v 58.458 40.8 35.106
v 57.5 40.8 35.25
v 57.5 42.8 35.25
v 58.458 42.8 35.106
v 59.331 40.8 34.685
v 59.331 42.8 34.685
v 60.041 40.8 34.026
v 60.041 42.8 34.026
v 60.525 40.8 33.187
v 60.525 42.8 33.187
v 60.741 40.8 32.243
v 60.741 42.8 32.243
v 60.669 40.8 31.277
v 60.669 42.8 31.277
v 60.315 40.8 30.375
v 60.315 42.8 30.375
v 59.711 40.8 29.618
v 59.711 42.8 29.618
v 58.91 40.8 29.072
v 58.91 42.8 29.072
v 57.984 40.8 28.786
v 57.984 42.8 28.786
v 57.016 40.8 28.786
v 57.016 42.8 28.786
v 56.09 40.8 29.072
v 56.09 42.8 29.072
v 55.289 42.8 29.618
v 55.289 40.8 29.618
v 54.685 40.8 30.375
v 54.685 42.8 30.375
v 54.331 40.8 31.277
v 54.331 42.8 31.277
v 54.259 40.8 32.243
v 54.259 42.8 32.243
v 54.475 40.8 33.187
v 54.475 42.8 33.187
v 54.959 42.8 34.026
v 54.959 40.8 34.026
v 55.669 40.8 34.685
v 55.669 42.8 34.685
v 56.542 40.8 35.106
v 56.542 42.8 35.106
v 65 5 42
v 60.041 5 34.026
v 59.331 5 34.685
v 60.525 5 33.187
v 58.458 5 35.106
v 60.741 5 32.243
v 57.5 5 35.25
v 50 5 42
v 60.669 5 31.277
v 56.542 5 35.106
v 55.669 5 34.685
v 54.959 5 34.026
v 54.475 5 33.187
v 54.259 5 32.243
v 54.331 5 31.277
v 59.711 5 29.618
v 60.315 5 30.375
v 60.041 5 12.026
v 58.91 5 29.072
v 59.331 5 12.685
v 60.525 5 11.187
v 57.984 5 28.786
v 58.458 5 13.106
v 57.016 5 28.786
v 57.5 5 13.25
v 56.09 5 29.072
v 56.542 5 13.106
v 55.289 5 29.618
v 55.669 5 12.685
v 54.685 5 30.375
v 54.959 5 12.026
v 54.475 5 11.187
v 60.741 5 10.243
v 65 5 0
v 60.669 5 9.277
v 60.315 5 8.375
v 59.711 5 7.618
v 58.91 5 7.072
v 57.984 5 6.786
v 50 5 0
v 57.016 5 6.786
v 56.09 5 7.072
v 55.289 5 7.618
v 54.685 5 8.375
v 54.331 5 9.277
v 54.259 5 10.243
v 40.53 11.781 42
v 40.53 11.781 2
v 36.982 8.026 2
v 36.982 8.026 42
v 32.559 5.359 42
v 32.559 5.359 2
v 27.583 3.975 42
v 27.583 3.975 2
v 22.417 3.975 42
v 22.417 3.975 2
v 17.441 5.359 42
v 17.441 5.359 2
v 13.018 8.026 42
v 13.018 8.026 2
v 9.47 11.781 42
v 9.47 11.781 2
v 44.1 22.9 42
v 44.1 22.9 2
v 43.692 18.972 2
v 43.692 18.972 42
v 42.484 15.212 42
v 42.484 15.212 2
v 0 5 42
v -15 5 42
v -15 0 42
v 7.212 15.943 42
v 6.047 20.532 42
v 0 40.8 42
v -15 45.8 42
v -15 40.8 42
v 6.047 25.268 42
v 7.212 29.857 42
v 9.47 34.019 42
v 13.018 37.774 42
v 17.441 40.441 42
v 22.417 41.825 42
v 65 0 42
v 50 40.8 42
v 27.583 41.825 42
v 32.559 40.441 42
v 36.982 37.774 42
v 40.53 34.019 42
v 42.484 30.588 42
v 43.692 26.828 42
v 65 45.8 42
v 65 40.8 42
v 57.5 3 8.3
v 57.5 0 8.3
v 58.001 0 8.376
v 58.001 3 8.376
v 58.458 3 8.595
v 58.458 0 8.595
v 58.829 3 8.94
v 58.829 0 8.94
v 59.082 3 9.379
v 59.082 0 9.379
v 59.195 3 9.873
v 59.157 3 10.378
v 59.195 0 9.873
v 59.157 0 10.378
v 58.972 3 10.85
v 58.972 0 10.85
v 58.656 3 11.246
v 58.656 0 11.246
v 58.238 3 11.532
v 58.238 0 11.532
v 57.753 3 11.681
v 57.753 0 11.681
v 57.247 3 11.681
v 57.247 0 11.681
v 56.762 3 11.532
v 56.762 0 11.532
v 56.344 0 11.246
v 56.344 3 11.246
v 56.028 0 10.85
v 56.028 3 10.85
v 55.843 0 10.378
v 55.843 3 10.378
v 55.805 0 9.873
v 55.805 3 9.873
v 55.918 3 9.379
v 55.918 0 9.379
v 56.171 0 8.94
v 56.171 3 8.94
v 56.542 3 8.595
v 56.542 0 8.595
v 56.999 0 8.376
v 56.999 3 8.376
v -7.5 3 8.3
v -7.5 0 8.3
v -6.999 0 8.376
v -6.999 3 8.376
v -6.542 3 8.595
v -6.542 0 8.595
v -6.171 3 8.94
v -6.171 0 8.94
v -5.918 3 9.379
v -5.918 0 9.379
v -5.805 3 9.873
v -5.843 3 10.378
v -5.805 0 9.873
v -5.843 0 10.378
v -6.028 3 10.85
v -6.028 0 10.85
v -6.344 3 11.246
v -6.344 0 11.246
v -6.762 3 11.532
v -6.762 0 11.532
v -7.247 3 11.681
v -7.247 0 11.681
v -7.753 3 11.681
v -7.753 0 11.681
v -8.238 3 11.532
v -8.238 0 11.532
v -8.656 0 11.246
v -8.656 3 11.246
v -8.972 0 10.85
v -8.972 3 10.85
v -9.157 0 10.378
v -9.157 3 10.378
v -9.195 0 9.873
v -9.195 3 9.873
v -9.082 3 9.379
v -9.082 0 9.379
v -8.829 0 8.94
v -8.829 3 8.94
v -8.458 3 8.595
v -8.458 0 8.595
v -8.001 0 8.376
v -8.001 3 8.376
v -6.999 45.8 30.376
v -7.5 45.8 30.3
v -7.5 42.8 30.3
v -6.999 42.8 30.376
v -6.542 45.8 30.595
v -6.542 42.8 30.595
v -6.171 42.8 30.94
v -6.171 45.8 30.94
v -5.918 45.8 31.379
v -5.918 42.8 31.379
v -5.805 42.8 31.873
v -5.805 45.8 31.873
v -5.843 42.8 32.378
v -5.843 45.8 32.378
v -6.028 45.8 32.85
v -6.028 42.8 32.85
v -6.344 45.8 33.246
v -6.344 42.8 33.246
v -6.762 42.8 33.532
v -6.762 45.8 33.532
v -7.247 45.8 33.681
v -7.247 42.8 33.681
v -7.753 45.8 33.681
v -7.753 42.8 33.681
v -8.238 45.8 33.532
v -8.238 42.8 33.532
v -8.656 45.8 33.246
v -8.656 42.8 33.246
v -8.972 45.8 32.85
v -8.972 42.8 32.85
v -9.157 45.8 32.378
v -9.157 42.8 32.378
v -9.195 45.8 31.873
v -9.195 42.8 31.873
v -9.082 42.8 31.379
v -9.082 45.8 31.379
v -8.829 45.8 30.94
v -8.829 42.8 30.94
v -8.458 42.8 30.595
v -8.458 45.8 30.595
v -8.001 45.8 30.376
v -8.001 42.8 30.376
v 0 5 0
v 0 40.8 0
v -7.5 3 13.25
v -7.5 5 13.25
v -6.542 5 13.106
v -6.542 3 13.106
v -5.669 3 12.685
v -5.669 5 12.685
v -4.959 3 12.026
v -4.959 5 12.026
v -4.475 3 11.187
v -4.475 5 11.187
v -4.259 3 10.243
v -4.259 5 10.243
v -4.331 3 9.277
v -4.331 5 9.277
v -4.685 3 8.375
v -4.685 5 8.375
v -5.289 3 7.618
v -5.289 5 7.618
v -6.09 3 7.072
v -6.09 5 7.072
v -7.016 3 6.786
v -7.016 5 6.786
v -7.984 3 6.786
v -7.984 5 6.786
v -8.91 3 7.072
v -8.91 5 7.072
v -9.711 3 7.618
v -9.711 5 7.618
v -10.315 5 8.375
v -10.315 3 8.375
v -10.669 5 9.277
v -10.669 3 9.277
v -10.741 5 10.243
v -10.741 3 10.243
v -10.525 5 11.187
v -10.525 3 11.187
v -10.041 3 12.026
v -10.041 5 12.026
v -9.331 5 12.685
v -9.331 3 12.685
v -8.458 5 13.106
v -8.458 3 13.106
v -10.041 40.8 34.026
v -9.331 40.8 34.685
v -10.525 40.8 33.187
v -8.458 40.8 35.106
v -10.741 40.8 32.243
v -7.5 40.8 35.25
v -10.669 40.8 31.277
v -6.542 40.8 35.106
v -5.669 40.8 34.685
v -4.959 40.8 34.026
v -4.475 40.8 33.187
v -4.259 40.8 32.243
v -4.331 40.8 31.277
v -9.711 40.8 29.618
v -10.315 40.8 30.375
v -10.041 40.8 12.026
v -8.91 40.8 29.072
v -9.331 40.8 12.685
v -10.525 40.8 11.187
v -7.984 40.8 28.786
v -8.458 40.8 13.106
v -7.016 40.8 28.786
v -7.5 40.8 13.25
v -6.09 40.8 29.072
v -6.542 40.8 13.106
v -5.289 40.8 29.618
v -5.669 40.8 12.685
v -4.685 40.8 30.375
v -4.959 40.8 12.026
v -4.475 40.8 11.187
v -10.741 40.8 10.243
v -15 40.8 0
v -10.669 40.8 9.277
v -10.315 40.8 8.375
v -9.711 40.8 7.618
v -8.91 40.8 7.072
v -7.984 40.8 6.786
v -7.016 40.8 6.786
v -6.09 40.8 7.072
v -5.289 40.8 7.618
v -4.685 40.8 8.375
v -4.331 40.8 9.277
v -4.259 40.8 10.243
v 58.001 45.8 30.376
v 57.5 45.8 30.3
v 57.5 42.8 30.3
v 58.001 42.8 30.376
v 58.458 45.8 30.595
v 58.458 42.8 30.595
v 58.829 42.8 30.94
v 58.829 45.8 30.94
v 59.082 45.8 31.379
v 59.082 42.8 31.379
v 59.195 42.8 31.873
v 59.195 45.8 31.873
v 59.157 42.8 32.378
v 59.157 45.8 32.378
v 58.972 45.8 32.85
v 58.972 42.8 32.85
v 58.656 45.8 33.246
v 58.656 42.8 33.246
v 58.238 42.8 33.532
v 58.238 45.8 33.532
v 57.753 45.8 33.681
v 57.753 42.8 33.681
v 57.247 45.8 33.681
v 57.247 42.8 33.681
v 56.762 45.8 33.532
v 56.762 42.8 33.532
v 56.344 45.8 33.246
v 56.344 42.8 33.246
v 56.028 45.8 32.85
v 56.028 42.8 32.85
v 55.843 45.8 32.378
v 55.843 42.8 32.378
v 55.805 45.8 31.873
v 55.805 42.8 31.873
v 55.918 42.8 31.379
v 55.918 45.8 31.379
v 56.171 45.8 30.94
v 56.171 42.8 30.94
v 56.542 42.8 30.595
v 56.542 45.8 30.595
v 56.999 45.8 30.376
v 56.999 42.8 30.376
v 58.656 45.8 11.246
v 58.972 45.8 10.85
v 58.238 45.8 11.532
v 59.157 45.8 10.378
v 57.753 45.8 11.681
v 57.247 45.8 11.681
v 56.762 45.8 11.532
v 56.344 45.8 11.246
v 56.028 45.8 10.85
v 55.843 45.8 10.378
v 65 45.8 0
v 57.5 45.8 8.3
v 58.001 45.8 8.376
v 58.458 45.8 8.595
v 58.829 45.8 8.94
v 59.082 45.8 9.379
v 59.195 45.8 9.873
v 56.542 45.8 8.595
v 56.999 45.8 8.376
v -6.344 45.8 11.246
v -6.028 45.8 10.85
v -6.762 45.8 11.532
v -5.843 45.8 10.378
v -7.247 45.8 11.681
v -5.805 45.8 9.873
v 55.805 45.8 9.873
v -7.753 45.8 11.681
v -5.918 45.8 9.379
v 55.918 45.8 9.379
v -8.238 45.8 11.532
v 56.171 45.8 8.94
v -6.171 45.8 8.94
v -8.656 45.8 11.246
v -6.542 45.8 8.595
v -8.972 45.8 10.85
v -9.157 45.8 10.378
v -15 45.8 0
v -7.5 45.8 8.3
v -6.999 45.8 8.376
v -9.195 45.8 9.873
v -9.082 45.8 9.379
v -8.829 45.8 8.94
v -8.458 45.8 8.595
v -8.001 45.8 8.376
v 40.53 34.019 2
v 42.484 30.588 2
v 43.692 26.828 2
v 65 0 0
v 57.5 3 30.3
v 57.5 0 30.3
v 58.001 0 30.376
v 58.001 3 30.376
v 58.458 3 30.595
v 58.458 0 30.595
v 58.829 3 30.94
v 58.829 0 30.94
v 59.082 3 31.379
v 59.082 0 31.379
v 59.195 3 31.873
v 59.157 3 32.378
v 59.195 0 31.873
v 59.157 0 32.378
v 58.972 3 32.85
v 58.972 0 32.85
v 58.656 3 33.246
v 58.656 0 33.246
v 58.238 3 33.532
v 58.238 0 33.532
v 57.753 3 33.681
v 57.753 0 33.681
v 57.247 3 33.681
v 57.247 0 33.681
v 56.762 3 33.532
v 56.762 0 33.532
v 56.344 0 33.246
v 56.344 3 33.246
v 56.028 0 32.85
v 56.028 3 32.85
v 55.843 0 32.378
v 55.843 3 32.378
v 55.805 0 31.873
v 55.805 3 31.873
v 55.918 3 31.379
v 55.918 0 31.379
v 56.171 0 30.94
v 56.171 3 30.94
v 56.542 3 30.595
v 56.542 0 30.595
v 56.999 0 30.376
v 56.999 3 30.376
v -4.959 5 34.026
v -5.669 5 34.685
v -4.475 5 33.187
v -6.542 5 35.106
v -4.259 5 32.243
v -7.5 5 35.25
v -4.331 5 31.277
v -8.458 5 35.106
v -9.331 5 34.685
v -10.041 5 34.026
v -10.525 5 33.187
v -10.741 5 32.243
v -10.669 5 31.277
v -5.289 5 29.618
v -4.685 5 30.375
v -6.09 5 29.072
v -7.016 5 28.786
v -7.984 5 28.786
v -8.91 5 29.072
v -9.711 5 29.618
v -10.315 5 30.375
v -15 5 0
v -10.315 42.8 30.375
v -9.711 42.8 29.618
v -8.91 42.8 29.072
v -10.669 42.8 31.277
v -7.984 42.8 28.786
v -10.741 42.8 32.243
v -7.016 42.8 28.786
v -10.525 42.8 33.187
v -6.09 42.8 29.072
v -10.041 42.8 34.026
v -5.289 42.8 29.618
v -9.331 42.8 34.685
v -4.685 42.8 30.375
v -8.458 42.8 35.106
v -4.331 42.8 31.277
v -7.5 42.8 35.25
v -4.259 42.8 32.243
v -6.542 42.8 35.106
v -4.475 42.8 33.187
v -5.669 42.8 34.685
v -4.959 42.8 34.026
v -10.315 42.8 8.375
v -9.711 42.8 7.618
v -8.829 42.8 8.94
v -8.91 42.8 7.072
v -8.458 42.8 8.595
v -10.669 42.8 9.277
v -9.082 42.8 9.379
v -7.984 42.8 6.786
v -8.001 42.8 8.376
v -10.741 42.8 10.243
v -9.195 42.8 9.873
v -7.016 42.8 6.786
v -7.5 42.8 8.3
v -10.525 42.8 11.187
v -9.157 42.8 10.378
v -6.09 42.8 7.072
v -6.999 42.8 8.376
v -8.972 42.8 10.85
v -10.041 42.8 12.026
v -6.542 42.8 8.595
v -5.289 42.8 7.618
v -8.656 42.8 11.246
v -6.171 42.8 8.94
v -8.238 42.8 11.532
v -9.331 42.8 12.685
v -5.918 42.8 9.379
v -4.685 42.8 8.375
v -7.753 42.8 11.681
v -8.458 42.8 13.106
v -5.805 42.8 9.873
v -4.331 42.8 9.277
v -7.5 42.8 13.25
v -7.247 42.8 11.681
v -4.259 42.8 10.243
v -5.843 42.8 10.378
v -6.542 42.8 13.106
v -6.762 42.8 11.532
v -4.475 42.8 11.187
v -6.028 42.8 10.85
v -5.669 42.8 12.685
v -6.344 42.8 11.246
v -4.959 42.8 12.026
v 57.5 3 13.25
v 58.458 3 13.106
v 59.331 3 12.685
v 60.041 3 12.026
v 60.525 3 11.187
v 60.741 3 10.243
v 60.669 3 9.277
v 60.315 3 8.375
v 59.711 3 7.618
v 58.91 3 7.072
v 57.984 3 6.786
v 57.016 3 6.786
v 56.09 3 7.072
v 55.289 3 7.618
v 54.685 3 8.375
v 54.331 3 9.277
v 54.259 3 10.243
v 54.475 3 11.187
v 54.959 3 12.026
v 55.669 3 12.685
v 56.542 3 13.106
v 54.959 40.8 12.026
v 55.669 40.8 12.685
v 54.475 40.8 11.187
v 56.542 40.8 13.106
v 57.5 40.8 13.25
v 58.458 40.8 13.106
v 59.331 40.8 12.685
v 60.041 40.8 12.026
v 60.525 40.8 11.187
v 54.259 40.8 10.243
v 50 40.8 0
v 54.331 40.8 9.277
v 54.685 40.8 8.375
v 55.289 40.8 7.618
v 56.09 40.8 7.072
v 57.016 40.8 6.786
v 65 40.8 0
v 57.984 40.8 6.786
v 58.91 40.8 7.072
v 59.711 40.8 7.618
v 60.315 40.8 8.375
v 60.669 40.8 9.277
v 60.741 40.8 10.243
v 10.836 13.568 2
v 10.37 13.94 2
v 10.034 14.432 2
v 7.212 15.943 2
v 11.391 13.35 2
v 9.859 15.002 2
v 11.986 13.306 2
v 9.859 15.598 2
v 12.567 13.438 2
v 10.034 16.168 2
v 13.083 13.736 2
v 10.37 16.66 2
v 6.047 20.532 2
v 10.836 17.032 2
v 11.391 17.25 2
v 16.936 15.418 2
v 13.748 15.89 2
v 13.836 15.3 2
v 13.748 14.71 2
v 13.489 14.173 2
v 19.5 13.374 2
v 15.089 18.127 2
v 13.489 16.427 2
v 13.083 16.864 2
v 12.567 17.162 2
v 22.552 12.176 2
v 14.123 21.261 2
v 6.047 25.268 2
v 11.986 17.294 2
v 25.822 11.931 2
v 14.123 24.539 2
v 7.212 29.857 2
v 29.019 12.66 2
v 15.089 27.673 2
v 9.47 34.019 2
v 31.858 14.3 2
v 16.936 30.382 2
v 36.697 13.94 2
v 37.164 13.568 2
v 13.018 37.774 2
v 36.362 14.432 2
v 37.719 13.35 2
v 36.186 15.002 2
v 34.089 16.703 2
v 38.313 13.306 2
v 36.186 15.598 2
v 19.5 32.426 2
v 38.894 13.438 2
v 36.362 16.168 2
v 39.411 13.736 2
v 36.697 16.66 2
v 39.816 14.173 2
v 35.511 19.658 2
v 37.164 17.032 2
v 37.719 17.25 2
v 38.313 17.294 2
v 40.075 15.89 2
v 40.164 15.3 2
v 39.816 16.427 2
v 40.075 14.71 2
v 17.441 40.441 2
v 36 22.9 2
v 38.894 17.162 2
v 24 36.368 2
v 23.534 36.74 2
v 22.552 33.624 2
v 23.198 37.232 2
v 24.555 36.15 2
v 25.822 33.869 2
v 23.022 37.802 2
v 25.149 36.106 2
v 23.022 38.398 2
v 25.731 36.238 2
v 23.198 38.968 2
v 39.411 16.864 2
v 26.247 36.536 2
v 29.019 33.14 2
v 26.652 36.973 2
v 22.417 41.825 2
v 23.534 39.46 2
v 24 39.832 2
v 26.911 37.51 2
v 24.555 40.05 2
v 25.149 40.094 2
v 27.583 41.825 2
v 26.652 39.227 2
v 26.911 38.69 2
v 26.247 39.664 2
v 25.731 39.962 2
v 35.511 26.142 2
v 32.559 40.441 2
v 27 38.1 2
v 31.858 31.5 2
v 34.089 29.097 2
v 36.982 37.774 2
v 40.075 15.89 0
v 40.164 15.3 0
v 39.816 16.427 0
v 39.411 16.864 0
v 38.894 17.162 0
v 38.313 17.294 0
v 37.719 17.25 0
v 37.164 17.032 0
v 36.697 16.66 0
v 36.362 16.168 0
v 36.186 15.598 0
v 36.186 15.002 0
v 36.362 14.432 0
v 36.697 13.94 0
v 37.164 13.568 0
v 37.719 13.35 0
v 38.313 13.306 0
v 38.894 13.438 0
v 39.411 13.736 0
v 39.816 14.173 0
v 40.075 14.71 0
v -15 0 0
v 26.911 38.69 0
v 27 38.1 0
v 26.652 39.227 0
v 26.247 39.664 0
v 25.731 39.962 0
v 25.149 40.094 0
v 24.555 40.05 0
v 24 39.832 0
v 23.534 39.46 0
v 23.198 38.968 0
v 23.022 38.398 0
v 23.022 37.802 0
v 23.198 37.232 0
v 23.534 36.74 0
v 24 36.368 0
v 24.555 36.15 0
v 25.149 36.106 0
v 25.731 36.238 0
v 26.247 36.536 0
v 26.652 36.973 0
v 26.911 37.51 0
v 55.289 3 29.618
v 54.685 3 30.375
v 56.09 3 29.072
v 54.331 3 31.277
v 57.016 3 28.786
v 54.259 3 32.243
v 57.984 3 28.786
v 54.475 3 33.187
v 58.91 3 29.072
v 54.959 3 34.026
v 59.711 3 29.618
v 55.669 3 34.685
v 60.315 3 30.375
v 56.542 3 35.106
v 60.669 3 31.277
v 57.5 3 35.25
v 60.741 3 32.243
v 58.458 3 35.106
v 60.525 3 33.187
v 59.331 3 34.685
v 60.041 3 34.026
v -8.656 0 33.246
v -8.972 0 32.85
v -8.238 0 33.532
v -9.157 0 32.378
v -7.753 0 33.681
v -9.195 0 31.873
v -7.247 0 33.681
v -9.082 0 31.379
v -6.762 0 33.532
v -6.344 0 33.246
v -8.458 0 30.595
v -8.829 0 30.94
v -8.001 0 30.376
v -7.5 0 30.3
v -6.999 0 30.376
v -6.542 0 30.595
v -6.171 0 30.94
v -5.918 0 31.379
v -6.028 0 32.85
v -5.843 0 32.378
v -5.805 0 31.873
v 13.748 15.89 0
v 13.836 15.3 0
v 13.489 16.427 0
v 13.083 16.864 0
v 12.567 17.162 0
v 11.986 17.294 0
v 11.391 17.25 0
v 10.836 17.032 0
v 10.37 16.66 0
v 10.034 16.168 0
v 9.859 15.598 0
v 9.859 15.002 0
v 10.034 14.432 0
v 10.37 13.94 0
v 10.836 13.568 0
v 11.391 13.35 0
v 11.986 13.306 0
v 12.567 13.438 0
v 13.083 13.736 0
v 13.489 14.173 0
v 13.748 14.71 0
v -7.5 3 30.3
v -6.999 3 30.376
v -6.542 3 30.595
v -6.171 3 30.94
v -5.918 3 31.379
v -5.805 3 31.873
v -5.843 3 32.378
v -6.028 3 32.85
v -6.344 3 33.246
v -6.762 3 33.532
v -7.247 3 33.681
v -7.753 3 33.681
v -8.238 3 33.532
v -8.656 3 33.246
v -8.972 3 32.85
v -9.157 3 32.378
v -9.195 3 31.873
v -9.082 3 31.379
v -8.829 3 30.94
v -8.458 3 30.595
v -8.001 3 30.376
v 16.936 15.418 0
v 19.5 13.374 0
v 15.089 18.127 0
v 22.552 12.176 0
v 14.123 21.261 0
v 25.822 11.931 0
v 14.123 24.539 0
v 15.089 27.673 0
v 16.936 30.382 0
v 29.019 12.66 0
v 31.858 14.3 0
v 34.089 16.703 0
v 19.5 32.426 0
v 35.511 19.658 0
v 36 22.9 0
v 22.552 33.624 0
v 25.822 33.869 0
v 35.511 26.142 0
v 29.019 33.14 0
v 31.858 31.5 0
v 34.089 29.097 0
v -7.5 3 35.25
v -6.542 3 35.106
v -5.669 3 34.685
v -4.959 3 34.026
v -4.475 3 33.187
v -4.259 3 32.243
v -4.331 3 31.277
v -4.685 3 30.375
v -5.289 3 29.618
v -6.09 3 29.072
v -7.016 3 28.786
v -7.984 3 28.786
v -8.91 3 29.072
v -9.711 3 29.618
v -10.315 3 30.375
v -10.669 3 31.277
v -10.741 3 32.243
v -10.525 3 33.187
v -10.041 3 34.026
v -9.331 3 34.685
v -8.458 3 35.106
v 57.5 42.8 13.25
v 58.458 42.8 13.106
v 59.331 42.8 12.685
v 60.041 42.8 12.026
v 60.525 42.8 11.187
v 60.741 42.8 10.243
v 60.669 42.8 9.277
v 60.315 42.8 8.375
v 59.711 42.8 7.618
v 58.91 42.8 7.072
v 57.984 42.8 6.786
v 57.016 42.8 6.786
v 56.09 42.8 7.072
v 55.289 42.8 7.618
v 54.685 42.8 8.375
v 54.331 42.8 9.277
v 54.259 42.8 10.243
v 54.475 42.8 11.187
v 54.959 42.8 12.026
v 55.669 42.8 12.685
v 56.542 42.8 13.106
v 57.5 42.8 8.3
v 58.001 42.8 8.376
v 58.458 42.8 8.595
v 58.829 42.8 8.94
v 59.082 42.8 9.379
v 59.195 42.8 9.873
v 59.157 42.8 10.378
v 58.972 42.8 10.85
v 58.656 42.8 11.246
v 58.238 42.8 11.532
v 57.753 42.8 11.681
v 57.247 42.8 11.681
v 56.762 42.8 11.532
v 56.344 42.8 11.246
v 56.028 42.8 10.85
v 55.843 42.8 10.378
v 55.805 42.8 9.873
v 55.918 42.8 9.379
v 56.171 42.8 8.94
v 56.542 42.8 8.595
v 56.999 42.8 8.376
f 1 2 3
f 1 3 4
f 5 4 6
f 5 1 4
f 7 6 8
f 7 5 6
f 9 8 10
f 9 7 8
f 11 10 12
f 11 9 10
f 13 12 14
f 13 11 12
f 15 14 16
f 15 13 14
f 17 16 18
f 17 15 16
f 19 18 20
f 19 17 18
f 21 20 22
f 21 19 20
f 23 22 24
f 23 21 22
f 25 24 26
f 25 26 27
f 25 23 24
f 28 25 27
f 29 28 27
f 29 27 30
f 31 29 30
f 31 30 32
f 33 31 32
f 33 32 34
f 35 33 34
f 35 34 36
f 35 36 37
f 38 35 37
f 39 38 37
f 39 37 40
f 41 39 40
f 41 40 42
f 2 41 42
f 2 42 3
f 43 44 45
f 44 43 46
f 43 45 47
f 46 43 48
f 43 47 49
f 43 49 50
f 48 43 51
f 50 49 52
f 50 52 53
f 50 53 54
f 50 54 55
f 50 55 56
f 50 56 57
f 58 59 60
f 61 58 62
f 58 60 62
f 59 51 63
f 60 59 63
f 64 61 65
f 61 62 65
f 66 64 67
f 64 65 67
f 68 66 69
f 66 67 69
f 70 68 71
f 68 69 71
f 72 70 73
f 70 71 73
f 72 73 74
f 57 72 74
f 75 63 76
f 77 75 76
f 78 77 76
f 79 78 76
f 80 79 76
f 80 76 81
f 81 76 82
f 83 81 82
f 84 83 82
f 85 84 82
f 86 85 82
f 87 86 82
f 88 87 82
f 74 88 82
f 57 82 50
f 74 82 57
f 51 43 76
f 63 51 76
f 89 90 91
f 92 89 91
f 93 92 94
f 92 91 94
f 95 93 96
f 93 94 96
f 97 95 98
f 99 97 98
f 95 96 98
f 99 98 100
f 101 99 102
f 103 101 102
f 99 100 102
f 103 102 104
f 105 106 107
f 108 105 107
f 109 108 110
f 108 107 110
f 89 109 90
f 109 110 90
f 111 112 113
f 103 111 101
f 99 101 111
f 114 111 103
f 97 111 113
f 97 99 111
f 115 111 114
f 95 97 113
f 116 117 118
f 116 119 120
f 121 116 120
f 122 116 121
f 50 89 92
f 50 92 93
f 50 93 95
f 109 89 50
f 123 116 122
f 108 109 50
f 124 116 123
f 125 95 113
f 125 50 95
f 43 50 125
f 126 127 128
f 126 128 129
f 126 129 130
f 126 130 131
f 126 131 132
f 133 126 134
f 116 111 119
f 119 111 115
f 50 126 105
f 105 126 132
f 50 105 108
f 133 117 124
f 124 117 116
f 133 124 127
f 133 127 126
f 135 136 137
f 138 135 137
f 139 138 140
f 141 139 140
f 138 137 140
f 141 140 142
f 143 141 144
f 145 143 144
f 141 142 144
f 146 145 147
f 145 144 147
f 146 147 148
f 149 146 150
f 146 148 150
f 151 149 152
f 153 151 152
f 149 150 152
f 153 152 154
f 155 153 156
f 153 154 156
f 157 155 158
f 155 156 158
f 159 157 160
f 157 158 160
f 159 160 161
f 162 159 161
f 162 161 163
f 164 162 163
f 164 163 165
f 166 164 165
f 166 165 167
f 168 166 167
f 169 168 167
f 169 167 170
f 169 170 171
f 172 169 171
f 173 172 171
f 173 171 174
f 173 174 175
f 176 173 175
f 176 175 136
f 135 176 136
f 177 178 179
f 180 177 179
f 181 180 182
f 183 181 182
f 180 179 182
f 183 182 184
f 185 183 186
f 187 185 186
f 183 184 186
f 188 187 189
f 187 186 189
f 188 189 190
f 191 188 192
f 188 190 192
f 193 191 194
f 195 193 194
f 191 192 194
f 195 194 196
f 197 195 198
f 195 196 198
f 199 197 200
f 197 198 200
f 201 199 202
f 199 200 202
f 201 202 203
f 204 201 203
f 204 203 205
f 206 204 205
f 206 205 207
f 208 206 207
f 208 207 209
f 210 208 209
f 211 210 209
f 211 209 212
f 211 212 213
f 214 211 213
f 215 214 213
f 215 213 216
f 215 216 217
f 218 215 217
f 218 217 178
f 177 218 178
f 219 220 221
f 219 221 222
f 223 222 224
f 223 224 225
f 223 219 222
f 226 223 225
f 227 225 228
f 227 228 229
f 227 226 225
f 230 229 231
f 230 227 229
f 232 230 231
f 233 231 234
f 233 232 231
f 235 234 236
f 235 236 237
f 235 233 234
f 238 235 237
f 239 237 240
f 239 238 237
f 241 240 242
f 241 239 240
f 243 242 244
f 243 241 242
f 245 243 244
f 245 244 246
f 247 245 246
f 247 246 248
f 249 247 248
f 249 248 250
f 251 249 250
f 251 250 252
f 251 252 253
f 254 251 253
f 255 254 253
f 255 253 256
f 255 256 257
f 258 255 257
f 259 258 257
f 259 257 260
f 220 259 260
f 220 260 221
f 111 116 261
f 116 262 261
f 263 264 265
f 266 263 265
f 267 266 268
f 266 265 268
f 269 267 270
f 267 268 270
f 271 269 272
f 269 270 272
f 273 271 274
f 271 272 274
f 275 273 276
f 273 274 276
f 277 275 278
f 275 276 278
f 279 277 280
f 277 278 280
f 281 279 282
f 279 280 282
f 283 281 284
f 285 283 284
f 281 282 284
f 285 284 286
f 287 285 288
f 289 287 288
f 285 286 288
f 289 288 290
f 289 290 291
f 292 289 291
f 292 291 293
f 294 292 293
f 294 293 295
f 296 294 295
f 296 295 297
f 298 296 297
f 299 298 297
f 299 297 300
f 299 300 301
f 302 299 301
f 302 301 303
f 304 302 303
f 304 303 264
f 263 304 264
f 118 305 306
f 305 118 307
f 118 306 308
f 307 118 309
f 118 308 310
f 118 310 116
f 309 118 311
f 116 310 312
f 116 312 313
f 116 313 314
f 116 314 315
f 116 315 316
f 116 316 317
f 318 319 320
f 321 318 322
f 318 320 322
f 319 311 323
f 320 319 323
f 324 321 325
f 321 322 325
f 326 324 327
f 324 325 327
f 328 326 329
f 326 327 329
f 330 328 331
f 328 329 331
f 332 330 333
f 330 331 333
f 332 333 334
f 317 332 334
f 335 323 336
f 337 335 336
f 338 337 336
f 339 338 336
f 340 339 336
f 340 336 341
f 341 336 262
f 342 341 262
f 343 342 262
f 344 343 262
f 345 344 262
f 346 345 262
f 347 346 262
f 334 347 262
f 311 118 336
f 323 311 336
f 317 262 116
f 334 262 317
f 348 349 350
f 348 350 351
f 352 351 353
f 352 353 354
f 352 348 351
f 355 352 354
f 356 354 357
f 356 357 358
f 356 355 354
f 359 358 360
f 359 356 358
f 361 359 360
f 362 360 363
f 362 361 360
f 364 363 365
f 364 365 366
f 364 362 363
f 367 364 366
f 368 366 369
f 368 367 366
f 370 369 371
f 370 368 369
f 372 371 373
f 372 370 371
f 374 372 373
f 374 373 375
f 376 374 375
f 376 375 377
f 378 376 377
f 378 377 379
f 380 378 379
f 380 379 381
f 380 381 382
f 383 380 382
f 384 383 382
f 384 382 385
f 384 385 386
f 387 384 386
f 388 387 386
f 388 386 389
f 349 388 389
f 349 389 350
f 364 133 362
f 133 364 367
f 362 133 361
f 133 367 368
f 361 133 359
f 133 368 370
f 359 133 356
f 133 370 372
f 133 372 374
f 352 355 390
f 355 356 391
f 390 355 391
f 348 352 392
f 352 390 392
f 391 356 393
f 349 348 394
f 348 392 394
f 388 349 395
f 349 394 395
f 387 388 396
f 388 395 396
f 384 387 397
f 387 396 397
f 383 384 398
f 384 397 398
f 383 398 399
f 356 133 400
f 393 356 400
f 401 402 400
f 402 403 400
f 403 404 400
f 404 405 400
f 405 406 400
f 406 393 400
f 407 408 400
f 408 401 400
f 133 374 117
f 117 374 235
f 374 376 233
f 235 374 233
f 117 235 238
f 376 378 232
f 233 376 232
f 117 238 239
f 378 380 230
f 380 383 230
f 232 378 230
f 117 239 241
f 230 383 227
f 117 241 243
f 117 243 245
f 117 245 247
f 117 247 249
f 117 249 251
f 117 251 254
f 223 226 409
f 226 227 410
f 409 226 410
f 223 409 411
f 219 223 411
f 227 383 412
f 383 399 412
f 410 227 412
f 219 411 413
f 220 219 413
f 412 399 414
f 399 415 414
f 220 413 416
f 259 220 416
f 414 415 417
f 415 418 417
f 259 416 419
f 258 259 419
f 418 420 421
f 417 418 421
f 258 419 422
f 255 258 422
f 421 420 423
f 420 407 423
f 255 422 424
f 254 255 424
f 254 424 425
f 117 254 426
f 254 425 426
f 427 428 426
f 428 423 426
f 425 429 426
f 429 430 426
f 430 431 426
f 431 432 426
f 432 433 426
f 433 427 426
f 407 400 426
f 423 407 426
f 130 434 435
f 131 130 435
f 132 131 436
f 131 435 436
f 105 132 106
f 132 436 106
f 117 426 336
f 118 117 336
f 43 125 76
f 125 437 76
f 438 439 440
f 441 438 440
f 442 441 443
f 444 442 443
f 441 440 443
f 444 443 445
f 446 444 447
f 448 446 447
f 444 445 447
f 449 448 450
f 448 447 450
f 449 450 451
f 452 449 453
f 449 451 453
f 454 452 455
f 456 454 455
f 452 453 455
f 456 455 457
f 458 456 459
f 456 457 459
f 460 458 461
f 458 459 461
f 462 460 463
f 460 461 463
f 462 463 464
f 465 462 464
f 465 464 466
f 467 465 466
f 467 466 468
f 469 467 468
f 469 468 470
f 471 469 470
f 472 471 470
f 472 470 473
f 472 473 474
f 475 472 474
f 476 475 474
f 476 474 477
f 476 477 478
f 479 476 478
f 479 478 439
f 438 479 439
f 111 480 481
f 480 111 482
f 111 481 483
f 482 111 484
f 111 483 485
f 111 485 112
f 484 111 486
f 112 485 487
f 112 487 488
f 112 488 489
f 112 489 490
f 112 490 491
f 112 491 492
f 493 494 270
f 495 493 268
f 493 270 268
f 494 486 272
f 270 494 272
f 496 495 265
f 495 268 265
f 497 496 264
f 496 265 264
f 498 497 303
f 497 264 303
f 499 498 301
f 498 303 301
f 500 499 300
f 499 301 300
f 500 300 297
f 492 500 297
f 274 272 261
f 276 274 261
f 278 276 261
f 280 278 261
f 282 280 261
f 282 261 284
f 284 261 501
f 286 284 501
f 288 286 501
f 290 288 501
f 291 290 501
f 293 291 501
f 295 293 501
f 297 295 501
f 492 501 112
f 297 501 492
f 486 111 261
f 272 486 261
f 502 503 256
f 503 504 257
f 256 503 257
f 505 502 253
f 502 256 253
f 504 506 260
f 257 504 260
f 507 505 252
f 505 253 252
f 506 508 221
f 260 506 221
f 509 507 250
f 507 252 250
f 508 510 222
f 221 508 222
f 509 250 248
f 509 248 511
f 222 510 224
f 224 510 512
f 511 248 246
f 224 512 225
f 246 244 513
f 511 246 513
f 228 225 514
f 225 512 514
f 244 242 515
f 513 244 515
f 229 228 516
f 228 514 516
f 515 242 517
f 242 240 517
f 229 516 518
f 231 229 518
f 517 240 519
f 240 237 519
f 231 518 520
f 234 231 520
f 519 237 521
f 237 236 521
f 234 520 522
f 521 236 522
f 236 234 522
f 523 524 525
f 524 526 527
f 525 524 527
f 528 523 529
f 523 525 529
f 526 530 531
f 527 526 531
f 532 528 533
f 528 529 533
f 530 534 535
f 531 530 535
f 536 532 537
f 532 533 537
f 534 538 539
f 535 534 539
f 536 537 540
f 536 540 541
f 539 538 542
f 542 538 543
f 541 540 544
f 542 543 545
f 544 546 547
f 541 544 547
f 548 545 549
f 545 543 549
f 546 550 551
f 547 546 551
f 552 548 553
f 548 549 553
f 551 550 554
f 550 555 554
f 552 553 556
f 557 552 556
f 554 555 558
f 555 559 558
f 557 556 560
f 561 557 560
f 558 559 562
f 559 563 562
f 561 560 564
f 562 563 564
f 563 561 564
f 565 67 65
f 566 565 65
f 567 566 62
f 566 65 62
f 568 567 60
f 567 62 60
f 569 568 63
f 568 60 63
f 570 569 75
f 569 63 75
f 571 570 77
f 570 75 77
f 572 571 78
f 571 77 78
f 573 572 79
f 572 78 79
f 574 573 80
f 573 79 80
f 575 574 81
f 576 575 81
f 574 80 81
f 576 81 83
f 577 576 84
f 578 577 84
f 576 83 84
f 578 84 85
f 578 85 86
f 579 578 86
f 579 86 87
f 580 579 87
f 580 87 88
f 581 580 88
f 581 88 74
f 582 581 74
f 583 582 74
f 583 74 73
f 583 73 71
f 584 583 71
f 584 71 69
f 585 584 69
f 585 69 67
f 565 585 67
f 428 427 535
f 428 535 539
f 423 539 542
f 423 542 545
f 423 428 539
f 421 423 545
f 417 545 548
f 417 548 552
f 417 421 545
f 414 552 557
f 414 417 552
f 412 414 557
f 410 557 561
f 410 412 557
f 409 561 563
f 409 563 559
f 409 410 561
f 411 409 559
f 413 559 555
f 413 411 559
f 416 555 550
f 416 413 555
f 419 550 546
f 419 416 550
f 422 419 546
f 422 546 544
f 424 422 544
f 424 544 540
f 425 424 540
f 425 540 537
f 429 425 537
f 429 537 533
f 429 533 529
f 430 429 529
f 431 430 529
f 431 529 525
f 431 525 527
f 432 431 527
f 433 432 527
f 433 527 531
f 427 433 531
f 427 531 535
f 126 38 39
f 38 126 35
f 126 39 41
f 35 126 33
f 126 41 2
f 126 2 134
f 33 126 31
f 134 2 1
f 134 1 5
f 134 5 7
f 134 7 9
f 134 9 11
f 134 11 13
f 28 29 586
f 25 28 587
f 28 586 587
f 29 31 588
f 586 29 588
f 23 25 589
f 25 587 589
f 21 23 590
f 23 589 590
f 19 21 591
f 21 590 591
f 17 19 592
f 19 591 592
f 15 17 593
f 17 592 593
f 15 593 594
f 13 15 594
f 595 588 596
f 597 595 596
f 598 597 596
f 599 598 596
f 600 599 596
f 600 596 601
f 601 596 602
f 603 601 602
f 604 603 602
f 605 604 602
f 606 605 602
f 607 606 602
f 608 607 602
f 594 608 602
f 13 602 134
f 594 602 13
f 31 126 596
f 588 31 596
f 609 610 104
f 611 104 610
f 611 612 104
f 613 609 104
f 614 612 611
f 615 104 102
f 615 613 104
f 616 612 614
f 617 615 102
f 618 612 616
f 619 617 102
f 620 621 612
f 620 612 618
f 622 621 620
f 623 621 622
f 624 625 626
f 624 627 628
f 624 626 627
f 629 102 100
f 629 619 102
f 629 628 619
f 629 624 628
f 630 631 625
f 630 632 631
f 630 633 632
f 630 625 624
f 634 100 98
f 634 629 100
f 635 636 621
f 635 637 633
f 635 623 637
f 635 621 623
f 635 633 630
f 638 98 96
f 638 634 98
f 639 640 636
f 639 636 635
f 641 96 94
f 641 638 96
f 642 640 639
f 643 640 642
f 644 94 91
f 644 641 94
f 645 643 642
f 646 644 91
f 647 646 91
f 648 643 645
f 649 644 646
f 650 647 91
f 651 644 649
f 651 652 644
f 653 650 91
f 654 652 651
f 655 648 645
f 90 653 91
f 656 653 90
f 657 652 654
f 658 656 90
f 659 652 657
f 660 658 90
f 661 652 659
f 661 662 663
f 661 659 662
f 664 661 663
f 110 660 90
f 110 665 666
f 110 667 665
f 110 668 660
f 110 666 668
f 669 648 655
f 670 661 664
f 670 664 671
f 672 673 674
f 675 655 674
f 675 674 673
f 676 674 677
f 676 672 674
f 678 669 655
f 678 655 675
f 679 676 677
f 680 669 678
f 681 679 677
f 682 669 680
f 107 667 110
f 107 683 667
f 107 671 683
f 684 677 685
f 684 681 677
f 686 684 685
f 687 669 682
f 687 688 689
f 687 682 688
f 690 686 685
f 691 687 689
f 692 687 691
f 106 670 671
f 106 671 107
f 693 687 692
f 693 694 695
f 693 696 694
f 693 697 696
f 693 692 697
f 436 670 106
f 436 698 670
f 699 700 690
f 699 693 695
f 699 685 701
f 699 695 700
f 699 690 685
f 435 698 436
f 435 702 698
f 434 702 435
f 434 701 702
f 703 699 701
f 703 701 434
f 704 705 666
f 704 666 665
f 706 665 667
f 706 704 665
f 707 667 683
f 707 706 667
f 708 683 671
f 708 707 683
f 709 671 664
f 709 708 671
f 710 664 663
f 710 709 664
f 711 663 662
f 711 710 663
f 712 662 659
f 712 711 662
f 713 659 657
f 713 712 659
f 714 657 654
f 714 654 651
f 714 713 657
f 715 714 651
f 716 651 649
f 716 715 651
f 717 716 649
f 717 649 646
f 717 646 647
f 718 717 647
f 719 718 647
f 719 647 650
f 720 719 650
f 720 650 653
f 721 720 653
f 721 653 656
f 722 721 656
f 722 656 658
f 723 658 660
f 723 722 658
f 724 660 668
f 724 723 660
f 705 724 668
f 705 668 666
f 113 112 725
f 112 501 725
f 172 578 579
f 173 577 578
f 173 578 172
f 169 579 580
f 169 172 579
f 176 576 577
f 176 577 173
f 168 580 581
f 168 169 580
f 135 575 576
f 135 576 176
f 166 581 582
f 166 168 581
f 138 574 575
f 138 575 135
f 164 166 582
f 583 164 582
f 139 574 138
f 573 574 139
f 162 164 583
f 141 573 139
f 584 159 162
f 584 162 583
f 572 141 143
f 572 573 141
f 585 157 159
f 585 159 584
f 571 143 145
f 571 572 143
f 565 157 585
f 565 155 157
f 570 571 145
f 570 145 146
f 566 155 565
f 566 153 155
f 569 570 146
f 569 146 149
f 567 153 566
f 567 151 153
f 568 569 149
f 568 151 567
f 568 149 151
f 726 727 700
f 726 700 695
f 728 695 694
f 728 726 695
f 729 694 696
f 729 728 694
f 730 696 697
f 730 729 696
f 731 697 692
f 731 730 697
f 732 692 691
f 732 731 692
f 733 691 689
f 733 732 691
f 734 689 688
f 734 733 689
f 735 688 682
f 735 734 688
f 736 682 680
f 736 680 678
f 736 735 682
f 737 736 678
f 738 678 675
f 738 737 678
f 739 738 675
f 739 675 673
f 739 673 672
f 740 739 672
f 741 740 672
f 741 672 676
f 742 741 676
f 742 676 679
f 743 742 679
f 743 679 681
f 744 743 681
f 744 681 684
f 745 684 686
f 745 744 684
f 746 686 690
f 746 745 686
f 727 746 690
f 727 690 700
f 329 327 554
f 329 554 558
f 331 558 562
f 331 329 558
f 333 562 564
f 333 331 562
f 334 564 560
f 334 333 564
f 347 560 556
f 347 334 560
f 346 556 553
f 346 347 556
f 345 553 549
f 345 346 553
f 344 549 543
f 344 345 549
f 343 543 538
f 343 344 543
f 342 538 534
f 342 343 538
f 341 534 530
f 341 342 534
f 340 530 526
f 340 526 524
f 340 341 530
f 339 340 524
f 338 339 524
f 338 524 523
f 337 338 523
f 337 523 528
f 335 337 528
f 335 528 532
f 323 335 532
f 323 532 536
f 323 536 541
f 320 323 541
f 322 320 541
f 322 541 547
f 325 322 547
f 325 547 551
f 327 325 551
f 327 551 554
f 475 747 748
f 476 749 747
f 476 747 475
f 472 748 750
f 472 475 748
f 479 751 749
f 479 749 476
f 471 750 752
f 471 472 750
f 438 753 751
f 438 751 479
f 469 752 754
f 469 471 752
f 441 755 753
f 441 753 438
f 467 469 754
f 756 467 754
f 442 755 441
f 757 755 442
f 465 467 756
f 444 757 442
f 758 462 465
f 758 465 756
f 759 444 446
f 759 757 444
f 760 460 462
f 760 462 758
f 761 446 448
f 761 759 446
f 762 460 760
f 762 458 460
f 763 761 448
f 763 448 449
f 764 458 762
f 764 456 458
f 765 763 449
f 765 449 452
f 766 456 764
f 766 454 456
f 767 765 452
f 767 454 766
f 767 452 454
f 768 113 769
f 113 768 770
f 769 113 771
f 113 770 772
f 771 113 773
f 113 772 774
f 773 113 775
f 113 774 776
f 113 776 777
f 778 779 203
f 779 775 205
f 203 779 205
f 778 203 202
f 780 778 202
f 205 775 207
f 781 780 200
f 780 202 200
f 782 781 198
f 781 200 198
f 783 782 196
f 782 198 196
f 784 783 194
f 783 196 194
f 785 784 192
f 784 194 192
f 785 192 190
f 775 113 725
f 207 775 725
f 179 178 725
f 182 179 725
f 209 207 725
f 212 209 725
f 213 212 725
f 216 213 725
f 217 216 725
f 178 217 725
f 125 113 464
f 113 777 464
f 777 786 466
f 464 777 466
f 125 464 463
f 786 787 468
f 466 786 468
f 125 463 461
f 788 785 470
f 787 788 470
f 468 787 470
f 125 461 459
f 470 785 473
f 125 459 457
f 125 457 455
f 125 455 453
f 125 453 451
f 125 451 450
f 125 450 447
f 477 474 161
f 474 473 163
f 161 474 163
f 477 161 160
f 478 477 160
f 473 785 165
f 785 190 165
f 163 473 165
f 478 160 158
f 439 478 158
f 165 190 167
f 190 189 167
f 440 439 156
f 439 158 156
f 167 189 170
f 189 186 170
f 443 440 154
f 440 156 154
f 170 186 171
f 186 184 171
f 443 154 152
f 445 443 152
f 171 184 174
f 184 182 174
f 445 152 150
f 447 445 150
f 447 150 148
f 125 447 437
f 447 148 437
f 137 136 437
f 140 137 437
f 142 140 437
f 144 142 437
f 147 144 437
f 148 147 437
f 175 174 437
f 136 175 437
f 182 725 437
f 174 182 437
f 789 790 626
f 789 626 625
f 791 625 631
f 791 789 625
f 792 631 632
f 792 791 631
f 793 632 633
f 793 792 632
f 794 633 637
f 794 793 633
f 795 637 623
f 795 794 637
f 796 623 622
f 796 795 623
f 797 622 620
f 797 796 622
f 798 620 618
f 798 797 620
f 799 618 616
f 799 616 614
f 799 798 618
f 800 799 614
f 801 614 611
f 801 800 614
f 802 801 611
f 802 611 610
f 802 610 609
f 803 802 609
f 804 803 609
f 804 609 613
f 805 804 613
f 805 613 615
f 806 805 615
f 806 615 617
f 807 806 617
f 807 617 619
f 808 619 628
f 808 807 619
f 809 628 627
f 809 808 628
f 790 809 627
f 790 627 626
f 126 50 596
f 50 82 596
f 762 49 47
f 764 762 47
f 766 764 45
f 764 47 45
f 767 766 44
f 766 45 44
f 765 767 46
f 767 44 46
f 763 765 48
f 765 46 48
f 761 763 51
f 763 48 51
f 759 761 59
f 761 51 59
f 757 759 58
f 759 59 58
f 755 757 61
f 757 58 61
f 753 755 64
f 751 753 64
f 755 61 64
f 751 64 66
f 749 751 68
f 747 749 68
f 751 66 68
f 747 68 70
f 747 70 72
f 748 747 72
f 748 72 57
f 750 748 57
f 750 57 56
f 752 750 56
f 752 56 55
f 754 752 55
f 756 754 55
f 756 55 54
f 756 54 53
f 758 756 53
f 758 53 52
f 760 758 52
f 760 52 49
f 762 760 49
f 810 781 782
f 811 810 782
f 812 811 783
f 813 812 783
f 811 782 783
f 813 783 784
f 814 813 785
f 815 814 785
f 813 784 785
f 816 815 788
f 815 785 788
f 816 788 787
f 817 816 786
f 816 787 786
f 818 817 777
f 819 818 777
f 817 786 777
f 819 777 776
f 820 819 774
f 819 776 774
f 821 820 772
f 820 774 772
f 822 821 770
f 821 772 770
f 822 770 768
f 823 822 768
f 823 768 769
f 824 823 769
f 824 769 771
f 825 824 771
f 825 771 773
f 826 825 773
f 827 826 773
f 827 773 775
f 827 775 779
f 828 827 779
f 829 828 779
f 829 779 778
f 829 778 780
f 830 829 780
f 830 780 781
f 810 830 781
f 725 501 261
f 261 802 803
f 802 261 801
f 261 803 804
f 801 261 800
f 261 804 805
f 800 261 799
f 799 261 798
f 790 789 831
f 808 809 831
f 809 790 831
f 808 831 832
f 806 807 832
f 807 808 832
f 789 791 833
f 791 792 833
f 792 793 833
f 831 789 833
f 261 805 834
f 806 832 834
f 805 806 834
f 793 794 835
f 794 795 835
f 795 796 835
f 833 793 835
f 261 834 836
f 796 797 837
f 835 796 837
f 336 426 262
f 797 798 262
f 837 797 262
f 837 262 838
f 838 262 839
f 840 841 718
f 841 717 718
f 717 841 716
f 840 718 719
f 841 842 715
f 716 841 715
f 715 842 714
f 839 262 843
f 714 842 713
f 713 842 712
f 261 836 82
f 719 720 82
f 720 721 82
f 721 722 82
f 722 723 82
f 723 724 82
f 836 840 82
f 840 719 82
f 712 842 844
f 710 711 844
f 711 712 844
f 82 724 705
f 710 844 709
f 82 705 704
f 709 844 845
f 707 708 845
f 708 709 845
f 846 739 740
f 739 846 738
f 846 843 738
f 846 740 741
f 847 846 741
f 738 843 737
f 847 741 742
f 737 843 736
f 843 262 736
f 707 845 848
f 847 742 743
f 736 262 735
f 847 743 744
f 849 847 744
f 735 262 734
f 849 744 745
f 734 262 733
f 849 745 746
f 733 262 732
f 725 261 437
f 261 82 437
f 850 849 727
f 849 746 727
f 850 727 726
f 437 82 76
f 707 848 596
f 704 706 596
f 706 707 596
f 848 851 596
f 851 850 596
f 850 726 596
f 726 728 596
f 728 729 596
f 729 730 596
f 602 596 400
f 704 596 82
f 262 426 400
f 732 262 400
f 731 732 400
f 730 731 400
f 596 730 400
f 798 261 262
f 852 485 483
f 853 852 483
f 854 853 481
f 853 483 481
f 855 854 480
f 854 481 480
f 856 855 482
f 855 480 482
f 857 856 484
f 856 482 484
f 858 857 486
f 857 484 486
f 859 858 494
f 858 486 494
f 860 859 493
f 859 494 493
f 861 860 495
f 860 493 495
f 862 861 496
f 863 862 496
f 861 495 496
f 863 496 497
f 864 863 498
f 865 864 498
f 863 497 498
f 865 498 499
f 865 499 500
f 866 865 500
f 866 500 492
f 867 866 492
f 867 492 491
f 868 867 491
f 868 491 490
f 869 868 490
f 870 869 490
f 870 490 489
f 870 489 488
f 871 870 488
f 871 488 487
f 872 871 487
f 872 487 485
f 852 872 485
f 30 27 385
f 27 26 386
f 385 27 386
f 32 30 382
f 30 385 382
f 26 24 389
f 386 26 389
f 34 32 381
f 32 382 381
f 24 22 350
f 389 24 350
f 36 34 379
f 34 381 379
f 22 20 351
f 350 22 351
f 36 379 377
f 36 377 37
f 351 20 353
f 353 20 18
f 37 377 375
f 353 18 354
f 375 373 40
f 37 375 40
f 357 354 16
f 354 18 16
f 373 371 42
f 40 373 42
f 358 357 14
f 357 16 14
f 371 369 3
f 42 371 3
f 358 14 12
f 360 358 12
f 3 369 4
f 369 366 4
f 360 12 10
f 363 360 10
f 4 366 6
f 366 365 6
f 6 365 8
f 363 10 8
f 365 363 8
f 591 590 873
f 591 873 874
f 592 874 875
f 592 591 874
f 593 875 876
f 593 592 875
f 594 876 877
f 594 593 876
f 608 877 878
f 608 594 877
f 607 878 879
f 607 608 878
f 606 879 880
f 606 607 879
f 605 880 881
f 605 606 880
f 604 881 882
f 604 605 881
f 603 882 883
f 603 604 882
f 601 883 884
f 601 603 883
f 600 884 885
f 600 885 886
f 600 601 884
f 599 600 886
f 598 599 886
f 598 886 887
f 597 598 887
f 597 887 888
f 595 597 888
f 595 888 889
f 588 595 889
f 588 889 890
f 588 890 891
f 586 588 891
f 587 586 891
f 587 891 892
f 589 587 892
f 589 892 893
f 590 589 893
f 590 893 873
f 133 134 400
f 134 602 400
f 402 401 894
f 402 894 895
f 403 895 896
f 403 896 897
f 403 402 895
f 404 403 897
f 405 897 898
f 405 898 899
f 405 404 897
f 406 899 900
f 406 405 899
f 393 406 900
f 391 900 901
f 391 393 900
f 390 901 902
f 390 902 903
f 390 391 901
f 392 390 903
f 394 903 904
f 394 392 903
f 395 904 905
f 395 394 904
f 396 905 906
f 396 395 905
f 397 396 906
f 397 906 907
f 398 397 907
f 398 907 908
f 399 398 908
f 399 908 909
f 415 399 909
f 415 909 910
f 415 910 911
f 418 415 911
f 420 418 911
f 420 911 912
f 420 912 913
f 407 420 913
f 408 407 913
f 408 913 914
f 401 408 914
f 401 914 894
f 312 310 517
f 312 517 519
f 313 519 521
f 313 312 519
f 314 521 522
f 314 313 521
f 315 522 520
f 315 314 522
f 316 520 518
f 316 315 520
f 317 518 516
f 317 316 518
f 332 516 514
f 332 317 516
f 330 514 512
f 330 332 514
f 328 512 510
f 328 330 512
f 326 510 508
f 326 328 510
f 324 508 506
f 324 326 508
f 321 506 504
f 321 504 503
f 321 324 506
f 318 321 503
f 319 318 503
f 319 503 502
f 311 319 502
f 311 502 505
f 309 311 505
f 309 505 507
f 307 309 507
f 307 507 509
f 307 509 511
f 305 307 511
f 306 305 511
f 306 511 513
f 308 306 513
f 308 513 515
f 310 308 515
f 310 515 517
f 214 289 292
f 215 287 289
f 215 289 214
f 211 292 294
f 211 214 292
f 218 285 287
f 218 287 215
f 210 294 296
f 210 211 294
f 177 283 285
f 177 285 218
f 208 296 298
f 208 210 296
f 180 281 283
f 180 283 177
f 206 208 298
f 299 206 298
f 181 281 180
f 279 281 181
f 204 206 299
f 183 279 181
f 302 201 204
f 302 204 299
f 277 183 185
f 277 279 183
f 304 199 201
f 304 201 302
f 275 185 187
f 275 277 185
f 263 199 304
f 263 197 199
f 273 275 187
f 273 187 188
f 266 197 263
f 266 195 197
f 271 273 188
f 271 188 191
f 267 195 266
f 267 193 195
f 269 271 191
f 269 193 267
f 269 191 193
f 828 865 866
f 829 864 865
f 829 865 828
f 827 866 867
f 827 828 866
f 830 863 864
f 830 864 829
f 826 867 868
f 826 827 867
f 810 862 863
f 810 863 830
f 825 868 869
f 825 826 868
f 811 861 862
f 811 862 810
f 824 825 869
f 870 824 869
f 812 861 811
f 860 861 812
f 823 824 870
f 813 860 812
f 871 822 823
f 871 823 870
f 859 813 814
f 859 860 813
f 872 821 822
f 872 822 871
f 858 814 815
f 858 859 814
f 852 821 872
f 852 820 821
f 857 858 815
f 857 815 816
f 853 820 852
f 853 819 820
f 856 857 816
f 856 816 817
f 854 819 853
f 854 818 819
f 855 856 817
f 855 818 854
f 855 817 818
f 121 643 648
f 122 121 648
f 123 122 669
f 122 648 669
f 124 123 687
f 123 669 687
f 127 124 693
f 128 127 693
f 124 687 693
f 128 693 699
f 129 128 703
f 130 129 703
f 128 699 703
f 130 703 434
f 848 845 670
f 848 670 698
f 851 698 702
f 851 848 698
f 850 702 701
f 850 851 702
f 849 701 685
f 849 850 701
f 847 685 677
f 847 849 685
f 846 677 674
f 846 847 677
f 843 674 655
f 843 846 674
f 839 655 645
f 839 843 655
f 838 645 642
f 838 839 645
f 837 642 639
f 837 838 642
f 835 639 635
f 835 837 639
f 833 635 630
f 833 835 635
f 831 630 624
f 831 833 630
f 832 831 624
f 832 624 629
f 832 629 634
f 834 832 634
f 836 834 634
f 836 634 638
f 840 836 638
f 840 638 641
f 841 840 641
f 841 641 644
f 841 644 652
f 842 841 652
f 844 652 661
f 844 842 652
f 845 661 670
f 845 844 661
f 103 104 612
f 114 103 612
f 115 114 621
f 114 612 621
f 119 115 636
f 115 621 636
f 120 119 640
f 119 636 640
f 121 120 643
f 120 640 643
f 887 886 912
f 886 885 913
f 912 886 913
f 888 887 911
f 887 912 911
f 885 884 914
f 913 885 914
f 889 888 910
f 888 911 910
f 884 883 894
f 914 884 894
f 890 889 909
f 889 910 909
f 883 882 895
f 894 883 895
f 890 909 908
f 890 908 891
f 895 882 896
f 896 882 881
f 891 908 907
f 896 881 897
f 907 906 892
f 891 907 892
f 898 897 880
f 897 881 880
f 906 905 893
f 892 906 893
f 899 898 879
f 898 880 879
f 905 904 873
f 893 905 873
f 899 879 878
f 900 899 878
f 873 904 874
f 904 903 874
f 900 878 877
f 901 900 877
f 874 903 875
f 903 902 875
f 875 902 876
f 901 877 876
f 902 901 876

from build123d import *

# Parameters (mm, degrees)
ESQUISSE1_R                                     = 2
ESQUISSE1_R_2                                   = 11
BOSS_EXTRU_1_DEPTH                              = 2
BOSS_EXTRU_2_DEPTH                              = 40
CHAMBRAGE_POUR_VIS_T_TE_CYLINDRIQUE_D           = 3.4
CHAMBRAGE_POUR_VIS_T_TE_CYLINDRIQUE_DEPTH       = 5
CHAMBRAGE_POUR_VIS_T_TE_CYLINDRIQUE_CBORE_D     = 6.5
CHAMBRAGE_POUR_VIS_T_TE_CYLINDRIQUE_CBORE_DEPTH = 2


with BuildPart() as part:
    # Esquisse1 → Boss.-Extru.1 (new body)
    with BuildSketch(Plane.XY):
        Polygon((0, 5), (-15, 5), (-15, 0), (65, 0), (65, 5), (50, 5), (50, 40.8), (65, 40.8), (65, 45.8), (-15, 45.8), (-15, 40.8), (0, 40.8), align=None)
        with Locations((25, 38.1)):
            Circle(ESQUISSE1_R, mode=Mode.SUBTRACT)
        with Locations((11.836413862, 15.3)):
            Circle(ESQUISSE1_R, mode=Mode.SUBTRACT)
        with Locations((38.163586138, 15.3)):
            Circle(ESQUISSE1_R, mode=Mode.SUBTRACT)
        with Locations((25, 22.9)):
            Circle(ESQUISSE1_R_2, mode=Mode.SUBTRACT)
    extrude(amount=BOSS_EXTRU_1_DEPTH)

    # Esquisse3 → Boss.-Extru.2 (add)
    with BuildSketch(Plane.XY.offset(2)):
        with BuildLine():
            Line((-15, 40.8), (0, 40.8))
            Line((0, 40.8), (9.470292352, 34.019270676))
            ThreePointArc((9.470292352, 34.019270676), (25, 42), (40.529707648, 34.019270676))
            Line((40.529707648, 34.019270676), (50, 40.8))
            Line((50, 40.8), (65, 40.8))
            Line((65, 40.8), (65, 45.8))
            Line((65, 45.8), (-15, 45.8))
            Line((-15, 45.8), (-15, 40.8))
        make_face()
        with BuildLine():
            Line((9.470292352, 34.019270676), (0, 40.8))
            Line((0, 40.8), (0, 5))
            Line((0, 5), (9.470292352, 11.780729324))
            ThreePointArc((9.470292352, 11.780729324), (5.9, 22.9), (9.470292352, 34.019270676))
        make_face()
        with BuildLine():
            Line((9.470292352, 11.780729324), (0, 5))
            Line((0, 5), (-15, 5))
            Line((-15, 5), (-15, 0))
            Line((-15, 0), (65, 0))
            Line((65, 0), (65, 5))
            Line((65, 5), (50, 5))
            Line((50, 5), (40.529707648, 11.780729324))
            ThreePointArc((40.529707648, 11.780729324), (25, 3.8), (9.470292352, 11.780729324))
        make_face()
        with BuildLine():
            Line((50, 40.8), (40.529707648, 34.019270676))
            ThreePointArc((40.529707648, 34.019270676), (43.185535682, 28.739203024), (44.1, 22.9))
            ThreePointArc((44.1, 22.9), (43.185535682, 17.060796976), (40.529707648, 11.780729324))
            Line((40.529707648, 11.780729324), (50, 5))
            Line((50, 5), (50, 40.8))
        make_face()
    extrude(amount=BOSS_EXTRU_2_DEPTH)

    # Chambrage pour vis à tête cylindrique à 6 pans creux (ou vis CHC) M31
    with Locations(Plane(origin=(57.5, 5, 32), x_dir=(0, 0, 1), z_dir=(0, 1, 0))):
        with Locations((0, 0), (-22, 0), (-22, -65), (0, -65)):
            chambrage_pour_vis_t_te_cylindrique = CounterBoreHole(CHAMBRAGE_POUR_VIS_T_TE_CYLINDRIQUE_D / 2, CHAMBRAGE_POUR_VIS_T_TE_CYLINDRIQUE_CBORE_D / 2, CHAMBRAGE_POUR_VIS_T_TE_CYLINDRIQUE_CBORE_DEPTH, depth=CHAMBRAGE_POUR_VIS_T_TE_CYLINDRIQUE_DEPTH)

    # Symétrie1: Chambrage pour vis à tête cylindrique à 6 pans creux (ou vis CHC) M31 across plane
    add(chambrage_pour_vis_t_te_cylindrique.mirror(Plane.ZX.offset(22.9)), mode=Mode.SUBTRACT)


solid = part.part
